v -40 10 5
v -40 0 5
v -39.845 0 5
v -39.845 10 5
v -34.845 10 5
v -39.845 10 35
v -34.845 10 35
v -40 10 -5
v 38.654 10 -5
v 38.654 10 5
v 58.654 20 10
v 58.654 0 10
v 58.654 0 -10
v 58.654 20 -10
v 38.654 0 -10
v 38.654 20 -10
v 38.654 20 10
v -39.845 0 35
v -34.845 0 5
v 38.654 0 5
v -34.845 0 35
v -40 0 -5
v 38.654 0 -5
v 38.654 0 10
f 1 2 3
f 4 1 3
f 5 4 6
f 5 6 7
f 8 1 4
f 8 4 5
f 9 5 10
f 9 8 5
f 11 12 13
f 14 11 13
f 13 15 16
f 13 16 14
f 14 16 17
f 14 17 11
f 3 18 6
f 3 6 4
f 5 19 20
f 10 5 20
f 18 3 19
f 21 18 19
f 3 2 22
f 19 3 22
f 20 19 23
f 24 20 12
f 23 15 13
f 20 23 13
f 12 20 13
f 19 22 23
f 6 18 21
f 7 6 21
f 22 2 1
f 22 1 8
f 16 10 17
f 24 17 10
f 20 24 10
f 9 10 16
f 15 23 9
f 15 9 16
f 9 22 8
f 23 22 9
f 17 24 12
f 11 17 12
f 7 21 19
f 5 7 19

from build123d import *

# Parameters (mm, degrees)
SKETCH3_W           = 20
SKETCH3_H           = 20
BOSS_EXTRUDE2_DEPTH = 20
SKETCH1_W           = 80
SKETCH1_H           = 10
BOSS_EXTRUDE3_DEPTH = 10
SKETCH6_W           = 5
SKETCH6_H           = 30
BOSS_EXTRUDE4_DEPTH = 10


with BuildPart() as part:
    # Sketch3 → Boss-Extrude2 (new body)
    with BuildSketch(Plane(origin=(0, 0, 0), x_dir=(1, 0, 0), z_dir=(0, 1, 0))):
        with Locations((48.654441815, 0)):
            Rectangle(SKETCH3_W, SKETCH3_H)
    extrude(amount=BOSS_EXTRUDE2_DEPTH)

    # Sketch1 → Boss-Extrude3 (add)
    with BuildSketch(Plane(origin=(0, 0, 0), x_dir=(1, 0, 0), z_dir=(0, 1, 0))):
        Rectangle(SKETCH1_W, SKETCH1_H)
    extrude(amount=BOSS_EXTRUDE3_DEPTH)

    # Sketch6 → Boss-Extrude4 (add)
    with BuildSketch(Plane(origin=(0, 0, 0), x_dir=(1, 0, 0), z_dir=(0, 1, 0))):
        with Locations((-37.345197049, -20)):
            Rectangle(SKETCH6_W, SKETCH6_H)
    extrude(amount=BOSS_EXTRUDE4_DEPTH)


solid = part.part
